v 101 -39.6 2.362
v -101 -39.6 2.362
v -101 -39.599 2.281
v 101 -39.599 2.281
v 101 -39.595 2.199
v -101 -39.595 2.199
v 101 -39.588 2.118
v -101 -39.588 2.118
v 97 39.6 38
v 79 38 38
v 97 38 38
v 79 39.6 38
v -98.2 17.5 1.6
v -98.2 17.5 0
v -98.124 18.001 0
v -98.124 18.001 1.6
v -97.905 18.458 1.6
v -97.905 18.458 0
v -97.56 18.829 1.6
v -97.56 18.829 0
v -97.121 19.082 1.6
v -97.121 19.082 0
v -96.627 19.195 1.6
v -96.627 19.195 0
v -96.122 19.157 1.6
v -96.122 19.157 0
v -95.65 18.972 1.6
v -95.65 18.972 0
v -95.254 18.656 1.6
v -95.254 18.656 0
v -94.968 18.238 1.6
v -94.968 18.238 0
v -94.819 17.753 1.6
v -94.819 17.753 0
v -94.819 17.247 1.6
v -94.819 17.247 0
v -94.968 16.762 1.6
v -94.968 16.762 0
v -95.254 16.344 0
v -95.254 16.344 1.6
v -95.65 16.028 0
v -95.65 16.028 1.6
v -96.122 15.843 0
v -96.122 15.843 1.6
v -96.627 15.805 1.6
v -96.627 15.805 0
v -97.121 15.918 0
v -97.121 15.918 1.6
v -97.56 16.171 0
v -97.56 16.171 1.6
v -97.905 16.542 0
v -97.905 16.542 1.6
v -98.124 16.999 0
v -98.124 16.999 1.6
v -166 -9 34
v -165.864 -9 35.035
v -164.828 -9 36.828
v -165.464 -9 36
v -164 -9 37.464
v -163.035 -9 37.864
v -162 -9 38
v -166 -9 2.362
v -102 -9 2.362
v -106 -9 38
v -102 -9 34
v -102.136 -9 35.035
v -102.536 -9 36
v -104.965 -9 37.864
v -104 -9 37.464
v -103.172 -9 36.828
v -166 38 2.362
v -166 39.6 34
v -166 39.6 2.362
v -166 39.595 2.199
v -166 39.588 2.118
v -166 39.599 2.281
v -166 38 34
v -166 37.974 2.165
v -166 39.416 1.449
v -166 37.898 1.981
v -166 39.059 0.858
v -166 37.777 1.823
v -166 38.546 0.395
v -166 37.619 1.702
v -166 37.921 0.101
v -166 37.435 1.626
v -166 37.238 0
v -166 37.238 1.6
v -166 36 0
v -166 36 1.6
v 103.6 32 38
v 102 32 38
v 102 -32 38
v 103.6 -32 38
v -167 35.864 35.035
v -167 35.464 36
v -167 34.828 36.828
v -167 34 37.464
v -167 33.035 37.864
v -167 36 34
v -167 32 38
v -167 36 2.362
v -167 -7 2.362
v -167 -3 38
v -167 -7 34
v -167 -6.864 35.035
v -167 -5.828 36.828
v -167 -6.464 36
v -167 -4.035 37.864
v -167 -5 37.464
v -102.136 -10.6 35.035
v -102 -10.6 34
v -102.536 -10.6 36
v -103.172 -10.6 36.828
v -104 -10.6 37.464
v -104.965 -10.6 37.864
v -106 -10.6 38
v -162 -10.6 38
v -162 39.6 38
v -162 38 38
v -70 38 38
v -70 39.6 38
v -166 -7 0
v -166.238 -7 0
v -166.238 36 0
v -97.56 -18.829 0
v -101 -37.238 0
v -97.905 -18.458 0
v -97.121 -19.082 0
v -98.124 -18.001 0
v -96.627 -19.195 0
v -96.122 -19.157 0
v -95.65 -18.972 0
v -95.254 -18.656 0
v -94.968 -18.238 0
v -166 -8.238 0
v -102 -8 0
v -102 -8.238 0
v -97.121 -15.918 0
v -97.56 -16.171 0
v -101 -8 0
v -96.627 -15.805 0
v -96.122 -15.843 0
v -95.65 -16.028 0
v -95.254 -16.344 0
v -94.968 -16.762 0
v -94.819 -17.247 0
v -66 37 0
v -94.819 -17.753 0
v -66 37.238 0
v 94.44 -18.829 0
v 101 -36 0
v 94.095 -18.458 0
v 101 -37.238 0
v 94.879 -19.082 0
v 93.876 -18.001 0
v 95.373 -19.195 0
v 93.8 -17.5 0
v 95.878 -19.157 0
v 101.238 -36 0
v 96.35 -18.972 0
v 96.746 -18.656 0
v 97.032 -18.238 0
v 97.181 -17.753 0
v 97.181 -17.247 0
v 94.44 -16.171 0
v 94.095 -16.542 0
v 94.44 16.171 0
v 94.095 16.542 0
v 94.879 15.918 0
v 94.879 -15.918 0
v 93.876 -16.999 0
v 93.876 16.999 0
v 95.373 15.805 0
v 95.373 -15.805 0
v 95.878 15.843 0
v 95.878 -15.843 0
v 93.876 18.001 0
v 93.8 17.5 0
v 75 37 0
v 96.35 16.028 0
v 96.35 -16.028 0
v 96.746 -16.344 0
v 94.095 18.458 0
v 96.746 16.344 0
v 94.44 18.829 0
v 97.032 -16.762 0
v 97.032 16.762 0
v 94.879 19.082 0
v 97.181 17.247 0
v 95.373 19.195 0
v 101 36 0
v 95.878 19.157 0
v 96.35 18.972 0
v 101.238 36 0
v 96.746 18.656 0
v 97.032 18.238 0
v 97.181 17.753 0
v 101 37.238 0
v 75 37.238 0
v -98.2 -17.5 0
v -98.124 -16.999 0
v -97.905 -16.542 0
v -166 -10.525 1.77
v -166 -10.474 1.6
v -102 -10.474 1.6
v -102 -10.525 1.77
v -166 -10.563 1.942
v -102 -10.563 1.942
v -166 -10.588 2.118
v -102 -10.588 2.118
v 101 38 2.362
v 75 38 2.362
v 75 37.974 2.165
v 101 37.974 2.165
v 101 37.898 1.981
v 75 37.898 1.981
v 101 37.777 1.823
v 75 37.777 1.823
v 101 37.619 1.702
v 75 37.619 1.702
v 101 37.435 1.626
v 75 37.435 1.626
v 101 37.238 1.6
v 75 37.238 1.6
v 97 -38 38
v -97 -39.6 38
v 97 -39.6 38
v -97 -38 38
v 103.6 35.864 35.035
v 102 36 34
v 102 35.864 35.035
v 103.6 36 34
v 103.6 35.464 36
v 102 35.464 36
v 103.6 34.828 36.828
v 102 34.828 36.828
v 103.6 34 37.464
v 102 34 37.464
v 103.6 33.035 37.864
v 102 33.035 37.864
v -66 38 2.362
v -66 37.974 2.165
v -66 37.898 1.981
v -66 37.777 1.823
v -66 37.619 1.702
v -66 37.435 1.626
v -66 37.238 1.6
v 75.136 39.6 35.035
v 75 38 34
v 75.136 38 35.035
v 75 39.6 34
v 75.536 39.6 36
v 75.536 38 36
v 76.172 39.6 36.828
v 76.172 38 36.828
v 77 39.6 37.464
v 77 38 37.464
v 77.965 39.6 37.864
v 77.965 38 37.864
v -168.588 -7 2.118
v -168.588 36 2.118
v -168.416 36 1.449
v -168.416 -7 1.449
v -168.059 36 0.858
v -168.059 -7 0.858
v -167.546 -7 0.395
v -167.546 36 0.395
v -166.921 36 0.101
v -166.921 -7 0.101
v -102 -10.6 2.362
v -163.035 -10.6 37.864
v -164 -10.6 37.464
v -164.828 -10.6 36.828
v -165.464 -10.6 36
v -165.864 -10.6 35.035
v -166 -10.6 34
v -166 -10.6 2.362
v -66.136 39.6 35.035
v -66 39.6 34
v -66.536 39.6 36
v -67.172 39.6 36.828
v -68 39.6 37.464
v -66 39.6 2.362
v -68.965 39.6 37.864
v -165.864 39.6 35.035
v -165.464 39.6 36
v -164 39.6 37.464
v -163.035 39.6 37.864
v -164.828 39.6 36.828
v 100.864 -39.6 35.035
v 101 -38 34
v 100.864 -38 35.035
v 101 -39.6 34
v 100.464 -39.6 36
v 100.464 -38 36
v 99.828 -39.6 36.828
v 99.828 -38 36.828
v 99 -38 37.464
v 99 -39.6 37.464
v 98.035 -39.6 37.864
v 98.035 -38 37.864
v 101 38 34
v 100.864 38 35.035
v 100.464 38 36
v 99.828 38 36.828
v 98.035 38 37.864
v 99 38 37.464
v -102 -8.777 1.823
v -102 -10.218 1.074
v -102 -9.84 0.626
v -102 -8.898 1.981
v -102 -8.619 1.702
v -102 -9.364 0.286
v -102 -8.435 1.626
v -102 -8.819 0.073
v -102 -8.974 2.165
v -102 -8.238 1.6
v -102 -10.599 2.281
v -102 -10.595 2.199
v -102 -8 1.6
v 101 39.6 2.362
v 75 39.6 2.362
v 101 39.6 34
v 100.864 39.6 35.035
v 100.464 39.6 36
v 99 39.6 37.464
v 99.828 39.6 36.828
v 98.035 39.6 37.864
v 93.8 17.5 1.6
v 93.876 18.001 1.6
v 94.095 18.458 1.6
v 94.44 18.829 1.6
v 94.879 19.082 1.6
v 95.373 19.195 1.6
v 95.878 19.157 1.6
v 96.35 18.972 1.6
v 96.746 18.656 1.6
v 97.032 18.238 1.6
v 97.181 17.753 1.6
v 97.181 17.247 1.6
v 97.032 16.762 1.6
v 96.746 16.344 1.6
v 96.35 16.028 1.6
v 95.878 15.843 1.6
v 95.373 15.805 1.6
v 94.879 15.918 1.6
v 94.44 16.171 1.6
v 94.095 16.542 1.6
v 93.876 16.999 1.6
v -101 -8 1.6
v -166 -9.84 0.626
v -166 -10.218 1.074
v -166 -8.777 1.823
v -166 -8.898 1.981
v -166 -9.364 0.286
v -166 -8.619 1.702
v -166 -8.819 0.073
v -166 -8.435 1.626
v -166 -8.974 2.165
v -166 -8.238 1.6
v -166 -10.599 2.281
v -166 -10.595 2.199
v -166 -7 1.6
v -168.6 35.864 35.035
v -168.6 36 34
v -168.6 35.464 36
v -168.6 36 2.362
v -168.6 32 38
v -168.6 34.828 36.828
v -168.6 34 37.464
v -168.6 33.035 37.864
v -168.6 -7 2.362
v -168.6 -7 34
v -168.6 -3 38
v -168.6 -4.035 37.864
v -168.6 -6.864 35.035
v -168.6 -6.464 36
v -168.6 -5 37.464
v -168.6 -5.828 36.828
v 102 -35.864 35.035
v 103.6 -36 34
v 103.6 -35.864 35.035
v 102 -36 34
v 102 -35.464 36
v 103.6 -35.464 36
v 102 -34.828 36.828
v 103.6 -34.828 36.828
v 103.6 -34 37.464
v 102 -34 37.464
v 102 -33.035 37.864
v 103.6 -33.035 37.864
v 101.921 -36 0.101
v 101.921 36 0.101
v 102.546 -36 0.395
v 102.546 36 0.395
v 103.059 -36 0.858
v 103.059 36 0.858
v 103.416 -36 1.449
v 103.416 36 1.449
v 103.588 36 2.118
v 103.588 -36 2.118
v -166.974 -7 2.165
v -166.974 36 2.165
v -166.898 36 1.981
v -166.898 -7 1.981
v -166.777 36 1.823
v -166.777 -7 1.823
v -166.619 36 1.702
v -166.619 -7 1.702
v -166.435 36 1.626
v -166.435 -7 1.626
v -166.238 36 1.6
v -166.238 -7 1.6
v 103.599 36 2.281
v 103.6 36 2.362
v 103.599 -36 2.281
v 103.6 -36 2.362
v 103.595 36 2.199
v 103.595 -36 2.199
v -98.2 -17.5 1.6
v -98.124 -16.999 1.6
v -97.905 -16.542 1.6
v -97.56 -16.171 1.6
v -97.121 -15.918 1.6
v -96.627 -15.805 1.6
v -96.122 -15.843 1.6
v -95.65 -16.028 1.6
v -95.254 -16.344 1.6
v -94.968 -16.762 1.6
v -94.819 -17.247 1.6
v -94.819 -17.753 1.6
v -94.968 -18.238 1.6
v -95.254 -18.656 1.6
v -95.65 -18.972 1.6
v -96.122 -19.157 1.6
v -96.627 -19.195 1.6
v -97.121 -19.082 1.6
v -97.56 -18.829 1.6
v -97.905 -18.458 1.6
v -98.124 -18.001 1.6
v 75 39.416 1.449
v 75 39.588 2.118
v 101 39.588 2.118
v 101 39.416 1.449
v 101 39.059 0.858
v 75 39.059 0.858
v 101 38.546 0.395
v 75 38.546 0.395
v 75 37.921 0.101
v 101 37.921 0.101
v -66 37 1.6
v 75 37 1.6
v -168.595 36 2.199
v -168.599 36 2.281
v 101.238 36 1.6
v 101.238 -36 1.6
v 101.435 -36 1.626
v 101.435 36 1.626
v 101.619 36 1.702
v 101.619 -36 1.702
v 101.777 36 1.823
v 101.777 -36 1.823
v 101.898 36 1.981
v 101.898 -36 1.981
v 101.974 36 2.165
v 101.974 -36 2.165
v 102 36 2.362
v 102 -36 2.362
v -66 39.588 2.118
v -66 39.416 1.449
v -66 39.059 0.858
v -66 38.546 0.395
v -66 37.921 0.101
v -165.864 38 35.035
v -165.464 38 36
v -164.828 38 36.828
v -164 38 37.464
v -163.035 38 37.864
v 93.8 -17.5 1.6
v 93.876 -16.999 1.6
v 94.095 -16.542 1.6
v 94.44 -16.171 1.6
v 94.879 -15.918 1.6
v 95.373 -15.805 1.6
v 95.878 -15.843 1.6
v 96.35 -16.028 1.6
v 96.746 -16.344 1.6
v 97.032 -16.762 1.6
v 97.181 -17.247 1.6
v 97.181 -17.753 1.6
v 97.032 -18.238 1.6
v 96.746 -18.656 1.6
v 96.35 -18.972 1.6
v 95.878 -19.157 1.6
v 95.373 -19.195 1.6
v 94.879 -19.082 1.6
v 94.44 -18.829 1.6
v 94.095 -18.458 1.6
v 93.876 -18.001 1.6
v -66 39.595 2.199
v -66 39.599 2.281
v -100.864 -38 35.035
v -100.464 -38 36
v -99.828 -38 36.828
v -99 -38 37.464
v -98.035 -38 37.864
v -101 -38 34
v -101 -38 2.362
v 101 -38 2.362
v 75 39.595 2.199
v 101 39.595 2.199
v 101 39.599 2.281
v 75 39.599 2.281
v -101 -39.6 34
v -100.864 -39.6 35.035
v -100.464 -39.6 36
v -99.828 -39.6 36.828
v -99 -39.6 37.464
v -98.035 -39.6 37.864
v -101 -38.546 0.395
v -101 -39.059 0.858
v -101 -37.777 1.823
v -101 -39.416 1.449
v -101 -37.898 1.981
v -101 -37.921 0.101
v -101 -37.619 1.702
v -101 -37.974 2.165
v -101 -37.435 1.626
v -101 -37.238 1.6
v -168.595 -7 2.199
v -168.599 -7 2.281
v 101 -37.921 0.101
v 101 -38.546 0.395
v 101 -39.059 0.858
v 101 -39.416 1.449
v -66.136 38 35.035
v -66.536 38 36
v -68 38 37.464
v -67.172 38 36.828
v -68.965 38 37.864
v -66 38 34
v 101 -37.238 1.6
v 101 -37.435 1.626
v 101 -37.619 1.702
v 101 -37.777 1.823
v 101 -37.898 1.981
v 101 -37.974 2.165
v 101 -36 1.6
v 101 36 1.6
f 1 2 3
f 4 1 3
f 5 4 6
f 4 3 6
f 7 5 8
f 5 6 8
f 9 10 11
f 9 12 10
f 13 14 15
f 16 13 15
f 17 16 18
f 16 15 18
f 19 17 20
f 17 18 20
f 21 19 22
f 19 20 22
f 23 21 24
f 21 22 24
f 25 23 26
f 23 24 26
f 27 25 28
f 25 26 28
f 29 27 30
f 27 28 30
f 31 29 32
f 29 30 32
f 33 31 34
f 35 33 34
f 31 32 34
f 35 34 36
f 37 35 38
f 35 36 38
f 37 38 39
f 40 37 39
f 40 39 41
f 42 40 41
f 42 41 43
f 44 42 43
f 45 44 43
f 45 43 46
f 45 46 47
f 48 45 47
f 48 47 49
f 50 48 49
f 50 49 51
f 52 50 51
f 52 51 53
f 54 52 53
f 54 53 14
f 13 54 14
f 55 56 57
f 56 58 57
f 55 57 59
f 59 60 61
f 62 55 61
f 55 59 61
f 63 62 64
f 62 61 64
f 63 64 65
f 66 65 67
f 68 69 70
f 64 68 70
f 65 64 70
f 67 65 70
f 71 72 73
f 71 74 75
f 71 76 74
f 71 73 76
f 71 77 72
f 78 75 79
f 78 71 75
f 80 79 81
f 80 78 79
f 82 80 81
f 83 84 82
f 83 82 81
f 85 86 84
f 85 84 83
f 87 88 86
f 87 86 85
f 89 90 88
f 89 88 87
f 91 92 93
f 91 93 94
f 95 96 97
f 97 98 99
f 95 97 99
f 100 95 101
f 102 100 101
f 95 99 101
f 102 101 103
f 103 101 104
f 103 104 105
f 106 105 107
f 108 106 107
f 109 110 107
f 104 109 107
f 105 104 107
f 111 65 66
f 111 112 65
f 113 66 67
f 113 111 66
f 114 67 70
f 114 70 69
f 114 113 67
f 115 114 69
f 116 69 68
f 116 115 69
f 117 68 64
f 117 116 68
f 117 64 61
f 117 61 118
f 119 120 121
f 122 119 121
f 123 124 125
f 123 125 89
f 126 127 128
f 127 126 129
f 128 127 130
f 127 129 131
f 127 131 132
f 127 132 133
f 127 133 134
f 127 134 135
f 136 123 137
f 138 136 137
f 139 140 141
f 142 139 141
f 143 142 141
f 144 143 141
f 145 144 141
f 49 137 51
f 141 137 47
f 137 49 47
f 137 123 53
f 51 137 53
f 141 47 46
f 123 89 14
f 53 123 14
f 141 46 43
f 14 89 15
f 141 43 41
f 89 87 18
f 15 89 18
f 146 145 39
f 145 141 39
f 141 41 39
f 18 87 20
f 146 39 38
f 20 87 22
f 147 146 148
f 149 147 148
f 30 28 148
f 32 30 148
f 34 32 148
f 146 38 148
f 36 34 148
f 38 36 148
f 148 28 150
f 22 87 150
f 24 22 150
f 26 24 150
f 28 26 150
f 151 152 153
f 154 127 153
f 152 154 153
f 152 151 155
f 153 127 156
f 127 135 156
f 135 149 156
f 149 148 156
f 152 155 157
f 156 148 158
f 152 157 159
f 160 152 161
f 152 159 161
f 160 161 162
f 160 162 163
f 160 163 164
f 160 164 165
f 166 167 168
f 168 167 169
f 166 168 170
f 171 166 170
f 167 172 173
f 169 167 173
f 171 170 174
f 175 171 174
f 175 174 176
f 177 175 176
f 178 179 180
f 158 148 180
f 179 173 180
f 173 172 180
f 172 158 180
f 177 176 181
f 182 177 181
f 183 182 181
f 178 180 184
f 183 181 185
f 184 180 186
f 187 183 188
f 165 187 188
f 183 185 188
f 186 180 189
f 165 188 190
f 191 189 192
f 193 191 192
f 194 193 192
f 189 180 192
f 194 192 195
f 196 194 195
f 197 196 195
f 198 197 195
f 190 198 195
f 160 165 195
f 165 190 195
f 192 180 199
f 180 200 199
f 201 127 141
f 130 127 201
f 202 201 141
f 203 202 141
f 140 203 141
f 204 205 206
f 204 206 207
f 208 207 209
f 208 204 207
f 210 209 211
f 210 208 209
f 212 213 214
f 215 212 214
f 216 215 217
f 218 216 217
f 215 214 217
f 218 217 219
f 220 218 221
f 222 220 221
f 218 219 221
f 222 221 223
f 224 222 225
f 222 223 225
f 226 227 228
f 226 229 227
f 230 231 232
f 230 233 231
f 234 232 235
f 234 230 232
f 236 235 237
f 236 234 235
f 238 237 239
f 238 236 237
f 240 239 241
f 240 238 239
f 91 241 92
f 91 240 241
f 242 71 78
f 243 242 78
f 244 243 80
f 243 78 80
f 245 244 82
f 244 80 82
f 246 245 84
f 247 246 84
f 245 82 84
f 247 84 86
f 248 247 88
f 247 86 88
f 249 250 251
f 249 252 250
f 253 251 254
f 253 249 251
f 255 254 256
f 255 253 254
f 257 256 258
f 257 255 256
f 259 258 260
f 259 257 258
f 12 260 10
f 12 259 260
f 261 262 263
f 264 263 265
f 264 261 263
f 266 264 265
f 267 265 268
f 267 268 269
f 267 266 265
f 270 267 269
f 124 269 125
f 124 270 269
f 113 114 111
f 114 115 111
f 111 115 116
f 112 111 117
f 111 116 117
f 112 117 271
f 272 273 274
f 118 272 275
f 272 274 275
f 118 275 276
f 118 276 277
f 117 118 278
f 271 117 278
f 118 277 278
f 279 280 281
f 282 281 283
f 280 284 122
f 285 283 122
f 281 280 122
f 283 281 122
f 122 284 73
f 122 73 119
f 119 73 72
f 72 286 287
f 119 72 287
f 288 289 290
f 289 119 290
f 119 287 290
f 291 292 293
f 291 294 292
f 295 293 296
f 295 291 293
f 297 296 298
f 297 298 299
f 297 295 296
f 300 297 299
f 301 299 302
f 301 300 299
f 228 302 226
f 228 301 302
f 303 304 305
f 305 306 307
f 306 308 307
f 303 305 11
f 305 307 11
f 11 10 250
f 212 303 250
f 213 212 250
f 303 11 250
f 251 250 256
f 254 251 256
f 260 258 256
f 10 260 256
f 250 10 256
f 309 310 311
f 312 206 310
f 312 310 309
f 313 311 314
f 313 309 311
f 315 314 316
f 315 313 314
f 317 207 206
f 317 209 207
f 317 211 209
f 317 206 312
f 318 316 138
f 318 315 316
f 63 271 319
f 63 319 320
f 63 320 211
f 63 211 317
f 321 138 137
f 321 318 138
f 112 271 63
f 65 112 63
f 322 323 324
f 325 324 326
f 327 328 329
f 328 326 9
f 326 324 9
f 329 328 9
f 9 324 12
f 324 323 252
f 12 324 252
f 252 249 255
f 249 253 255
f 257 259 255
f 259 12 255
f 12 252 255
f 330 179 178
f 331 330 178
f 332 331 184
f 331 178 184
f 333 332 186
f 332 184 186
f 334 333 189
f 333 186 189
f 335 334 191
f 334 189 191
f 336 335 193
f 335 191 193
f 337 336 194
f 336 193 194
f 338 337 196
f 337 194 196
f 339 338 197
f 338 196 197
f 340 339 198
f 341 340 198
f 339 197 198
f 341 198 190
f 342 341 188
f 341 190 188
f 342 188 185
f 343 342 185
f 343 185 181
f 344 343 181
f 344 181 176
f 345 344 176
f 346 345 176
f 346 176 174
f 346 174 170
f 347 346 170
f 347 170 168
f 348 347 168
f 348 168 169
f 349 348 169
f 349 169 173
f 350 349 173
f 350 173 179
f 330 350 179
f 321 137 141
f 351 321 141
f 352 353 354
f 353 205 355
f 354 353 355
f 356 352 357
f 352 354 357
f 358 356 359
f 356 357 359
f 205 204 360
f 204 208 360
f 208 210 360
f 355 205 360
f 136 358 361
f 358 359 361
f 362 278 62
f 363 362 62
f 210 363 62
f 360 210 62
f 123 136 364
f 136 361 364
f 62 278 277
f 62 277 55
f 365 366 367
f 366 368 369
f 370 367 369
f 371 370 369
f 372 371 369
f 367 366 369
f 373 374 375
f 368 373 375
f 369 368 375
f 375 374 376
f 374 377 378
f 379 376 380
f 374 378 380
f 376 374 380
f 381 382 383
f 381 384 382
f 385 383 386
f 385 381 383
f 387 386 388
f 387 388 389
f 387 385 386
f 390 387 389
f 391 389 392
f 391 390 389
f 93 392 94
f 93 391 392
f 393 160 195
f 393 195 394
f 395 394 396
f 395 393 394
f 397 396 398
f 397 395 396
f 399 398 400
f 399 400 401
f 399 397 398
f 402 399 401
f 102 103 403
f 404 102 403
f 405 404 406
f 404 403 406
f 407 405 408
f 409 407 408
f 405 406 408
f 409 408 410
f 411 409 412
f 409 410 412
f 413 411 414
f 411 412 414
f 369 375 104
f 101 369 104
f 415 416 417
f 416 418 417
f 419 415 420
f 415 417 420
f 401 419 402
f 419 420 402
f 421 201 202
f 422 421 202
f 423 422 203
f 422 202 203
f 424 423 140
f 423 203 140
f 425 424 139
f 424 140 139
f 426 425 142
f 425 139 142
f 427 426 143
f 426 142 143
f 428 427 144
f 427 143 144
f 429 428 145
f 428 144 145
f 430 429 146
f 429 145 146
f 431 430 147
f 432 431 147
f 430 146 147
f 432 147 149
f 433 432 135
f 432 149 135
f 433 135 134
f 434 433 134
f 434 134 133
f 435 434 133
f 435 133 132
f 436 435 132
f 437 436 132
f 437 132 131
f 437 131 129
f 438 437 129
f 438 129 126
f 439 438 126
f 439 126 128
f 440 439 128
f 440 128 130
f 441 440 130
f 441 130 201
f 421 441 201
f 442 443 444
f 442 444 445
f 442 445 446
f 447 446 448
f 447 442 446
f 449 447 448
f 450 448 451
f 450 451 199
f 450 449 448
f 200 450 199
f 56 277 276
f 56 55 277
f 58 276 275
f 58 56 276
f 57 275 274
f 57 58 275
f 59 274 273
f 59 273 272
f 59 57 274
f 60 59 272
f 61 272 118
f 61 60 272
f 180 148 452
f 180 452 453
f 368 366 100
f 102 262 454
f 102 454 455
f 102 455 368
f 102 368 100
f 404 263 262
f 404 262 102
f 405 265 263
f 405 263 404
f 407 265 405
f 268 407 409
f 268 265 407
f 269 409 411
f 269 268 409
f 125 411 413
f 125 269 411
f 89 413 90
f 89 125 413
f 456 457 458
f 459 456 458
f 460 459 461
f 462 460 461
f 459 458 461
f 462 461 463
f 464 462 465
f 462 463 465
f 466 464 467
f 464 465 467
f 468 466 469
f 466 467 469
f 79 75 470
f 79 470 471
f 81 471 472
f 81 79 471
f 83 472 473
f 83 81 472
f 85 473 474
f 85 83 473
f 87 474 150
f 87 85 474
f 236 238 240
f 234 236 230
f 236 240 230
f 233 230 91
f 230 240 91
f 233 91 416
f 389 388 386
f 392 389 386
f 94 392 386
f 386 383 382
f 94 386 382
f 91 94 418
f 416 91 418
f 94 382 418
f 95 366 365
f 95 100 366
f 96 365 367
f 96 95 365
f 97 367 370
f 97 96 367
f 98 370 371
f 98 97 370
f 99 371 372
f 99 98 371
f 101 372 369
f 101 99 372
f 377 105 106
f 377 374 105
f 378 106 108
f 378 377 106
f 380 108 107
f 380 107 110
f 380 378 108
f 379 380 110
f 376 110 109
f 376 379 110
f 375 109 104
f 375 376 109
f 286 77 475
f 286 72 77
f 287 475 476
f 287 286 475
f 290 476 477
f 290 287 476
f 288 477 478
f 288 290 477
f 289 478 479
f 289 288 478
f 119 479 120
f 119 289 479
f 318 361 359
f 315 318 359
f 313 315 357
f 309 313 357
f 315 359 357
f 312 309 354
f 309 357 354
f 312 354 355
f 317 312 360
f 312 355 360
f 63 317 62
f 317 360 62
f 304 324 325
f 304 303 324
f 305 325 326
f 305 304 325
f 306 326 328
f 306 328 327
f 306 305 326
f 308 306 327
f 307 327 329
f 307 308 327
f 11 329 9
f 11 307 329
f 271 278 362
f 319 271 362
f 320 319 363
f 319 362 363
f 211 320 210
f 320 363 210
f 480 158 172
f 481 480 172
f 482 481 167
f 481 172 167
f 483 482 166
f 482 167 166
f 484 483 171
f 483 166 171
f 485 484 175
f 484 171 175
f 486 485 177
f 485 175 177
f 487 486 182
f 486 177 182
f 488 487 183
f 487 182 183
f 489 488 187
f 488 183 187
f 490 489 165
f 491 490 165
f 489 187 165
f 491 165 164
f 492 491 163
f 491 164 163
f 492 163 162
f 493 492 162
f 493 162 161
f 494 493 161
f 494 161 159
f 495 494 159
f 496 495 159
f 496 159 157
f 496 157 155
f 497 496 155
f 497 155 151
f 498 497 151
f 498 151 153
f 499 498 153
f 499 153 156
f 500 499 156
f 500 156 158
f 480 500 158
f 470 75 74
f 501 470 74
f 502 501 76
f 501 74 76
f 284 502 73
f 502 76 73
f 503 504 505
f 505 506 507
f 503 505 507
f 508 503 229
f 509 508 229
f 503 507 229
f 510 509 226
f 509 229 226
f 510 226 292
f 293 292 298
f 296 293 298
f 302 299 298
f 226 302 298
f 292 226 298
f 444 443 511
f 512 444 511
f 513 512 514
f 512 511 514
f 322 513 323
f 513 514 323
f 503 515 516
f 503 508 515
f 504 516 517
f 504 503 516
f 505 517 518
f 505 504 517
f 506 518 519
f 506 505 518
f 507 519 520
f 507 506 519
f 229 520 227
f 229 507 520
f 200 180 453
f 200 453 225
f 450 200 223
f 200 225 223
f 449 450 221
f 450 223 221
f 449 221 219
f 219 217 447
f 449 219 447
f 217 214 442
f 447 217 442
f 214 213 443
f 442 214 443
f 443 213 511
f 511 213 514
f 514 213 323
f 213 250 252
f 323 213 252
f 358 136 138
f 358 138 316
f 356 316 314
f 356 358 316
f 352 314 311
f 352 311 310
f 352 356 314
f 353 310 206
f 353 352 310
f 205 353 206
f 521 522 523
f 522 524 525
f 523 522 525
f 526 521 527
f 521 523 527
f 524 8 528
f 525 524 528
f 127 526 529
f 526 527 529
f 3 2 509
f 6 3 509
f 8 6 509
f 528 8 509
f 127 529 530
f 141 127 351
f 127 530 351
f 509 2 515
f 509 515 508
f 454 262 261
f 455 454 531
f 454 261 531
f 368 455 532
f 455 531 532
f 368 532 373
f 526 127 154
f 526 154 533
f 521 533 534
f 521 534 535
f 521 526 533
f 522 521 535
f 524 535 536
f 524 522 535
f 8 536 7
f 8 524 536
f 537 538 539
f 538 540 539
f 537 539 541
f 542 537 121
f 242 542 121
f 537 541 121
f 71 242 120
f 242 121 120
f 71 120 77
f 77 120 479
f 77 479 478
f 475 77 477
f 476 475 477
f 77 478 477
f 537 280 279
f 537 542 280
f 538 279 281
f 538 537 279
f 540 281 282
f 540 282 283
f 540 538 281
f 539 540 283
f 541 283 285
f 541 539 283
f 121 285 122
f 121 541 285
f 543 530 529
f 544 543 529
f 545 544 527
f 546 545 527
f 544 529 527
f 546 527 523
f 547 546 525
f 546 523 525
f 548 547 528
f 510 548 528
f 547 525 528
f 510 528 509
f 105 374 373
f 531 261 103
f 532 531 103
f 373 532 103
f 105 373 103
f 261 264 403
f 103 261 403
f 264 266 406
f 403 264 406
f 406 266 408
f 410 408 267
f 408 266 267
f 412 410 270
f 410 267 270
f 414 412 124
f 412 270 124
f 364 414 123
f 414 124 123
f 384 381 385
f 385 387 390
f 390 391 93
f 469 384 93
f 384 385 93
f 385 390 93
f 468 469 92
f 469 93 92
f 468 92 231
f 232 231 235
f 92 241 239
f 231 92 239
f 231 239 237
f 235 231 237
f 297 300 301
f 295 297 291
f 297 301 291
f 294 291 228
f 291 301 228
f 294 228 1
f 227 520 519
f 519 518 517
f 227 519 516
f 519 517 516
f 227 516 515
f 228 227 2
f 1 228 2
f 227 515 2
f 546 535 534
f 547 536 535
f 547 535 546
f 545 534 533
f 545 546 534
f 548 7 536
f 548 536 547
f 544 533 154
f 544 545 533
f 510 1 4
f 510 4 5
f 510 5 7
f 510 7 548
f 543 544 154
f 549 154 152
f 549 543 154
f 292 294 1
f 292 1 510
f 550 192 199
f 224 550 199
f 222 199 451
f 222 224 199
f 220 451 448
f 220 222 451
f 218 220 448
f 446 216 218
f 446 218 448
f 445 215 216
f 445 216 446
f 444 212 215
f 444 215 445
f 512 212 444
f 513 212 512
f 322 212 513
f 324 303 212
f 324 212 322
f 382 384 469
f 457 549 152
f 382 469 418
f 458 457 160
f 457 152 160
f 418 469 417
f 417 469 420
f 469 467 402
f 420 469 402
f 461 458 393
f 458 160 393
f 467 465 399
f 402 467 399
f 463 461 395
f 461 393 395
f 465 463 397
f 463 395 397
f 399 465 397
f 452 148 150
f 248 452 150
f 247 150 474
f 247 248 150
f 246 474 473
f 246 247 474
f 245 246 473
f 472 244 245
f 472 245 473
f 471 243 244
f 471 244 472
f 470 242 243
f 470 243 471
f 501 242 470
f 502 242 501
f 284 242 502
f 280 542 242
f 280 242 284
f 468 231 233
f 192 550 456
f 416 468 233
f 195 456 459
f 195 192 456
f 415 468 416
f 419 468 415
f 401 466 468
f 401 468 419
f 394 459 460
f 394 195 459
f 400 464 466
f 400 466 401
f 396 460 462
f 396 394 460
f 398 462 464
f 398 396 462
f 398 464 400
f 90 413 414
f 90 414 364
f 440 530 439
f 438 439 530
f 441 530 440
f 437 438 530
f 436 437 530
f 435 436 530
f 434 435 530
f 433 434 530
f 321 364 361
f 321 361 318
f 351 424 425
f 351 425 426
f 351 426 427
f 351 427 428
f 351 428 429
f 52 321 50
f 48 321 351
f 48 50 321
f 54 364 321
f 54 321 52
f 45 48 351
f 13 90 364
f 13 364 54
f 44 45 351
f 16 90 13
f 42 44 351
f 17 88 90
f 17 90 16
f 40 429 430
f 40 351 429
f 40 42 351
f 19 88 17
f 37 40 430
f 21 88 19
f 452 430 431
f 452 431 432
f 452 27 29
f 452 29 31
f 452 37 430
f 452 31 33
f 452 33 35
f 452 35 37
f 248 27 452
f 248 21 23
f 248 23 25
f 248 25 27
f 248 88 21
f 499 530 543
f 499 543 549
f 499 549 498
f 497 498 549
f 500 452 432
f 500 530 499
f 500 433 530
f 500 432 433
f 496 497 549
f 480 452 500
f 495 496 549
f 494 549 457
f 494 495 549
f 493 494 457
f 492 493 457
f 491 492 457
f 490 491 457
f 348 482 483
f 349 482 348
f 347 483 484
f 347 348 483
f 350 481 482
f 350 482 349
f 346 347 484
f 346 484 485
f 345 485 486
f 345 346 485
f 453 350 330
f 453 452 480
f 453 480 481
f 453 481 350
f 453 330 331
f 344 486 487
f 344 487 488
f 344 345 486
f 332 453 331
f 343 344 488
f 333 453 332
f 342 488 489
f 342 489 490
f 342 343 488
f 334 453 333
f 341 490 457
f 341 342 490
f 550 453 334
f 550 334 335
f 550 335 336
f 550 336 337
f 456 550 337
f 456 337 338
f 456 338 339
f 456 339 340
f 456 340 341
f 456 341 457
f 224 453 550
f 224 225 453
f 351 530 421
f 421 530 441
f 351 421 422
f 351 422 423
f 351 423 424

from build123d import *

# Parameters (mm, degrees)
SKETCH1_W              = 202
SKETCH1_H              = 74
BOSS_EXTRUDE1_DEPTH    = 1.6002
M3_CLEARANCE_HOLE1_D   = 3.4
SKETCH3_W              = 202
SKETCH3_H              = 2.5875
BOSS_EXTRUDE2_DEPTH    = 38
SKETCH6_W              = 35
SKETCH6_H              = 2.5875
SKETCH6_W_2            = 26
BOSS_EXTRUDE3_DEPTH    = 38
SKETCH7_W              = 2.5875
SKETCH7_H              = 72
BOSS_EXTRUDE4_DEPTH    = 38
SKETCH8_W              = 65
SKETCH8_H              = 45
BOSS_EXTRUDE5_DEPTH    = 1.6002
SKETCH9_W              = 65
SKETCH9_H              = 38
BOSS_EXTRUDE6_DEPTH    = 2.5875
SKETCH10_W             = 2.5875
SKETCH10_H             = 43
SKETCH10_W_2           = 64
SKETCH10_H_2           = 2.5875
BOSS_EXTRUDE7_DEPTH    = 38
CUT_EXTRUDE1_DEPTH     = 36.3998
CONVERT_SOLID1_START   = -101
CONVERT_SOLID1_DEPTH   = 202
CONVERT_SOLID1_START_2 = -166
CONVERT_SOLID1_2_DEPTH = 64
CONVERT_SOLID1_START_3 = -102
CONVERT_SOLID1_3_DEPTH = 36
CONVERT_SOLID1_START_4 = 75
CONVERT_SOLID1_4_DEPTH = 26
CONVERT_SOLID1_START_5 = -7
CONVERT_SOLID1_5_DEPTH = 43
CONVERT_SOLID1_START_6 = -36
CONVERT_SOLID1_6_DEPTH = 29
CONVERT_SOLID1_7_DEPTH = 267
CONVERT_SOLID1_8_DEPTH = 64
CONVERT_SOLID1_9_DEPTH = 72
FILLET1_R              = 4


# Read off the part's stored shape, not the designer's step: Convert-Solid1
with BuildPart() as part:
    # Sketch1 → Boss-Extrude1 (new body)
    with BuildSketch(Plane.XY):
        Rectangle(SKETCH1_W, SKETCH1_H)
    extrude(amount=BOSS_EXTRUDE1_DEPTH)

    # M3 Clearance Hole1 (through all)
    with Locations(Plane.XY.offset(1.6002)):
        with Locations((-96.5, 17.5), (95.5, -17.5), (-96.5, -17.5), (95.5, 17.5)):
            Hole(M3_CLEARANCE_HOLE1_D / 2)

    # Sketch3 → Boss-Extrude2 (add)
    with BuildSketch(Plane.XY):
        with Locations((0, -38.29375)):
            Rectangle(SKETCH3_W, SKETCH3_H)
    extrude(amount=BOSS_EXTRUDE2_DEPTH)

    # Sketch6 → Boss-Extrude3 (add)
    with BuildSketch(Plane.XY):
        with Locations((-83.5, 38.29375)):
            Rectangle(SKETCH6_W, SKETCH6_H)
        with Locations((88, 38.29375)):
            Rectangle(SKETCH6_W_2, SKETCH6_H)
    extrude(amount=BOSS_EXTRUDE3_DEPTH)

    # Sketch7 → Boss-Extrude4 (add)
    with BuildSketch(Plane.XY):
        with Locations((102.29375, 0)):
            Rectangle(SKETCH7_W, SKETCH7_H)
    extrude(amount=BOSS_EXTRUDE4_DEPTH)

    # Sketch8 → Boss-Extrude5 (add)
    with BuildSketch(Plane.XY):
        with Locations((-133.5, 14.5)):
            Rectangle(SKETCH8_W, SKETCH8_H)
    extrude(amount=BOSS_EXTRUDE5_DEPTH)

    # Sketch9 → Boss-Extrude6 (add)
    with BuildSketch(Plane(origin=(0, 37, 0), x_dir=(1, 0, 0), z_dir=(0, 1, 0))):
        with Locations((-133.5, -19)):
            Rectangle(SKETCH9_W, SKETCH9_H)
    extrude(amount=BOSS_EXTRUDE6_DEPTH)

    # Sketch10 → Boss-Extrude7 (add)
    with BuildSketch(Plane.XY):
        with Locations((-167.29375, 14.5)):
            Rectangle(SKETCH10_W, SKETCH10_H)
        with Locations((-134, -9.29375)):
            Rectangle(SKETCH10_W_2, SKETCH10_H_2)
    extrude(amount=BOSS_EXTRUDE7_DEPTH)

    # Sketch15 → Cut-Extrude1 (cut)
    with BuildSketch(Plane.XY.offset(38)):
        Polygon((102, 38), (-167, 38), (-167, -9), (-102, -9), (-102, -38), (102, -38), align=None)
    extrude(amount=-CUT_EXTRUDE1_DEPTH, mode=Mode.SUBTRACT)

    # Convert-Solid1 outline → Convert-Solid1 (add)
    with BuildSketch(Plane.YZ.offset(CONVERT_SOLID1_START)):
        with BuildLine():
            Line((-38, 1.6002), (-37.238, 1.6002))
            ThreePointArc((-37.238, 1.6002), (-37.776815367, 1.823384633), (-38, 2.3622))
            Line((-38, 2.3622), (-38, 1.6002))
        make_face()
        with BuildLine():
            Line((-39.5875, 2.117580723), (-39.5875, 38))
            Line((-39.5875, 38), (-39.6002, 38))
            Line((-39.6002, 38), (-39.6002, 2.3622))
            ThreePointArc((-39.6002, 2.3622), (-39.597022863, 2.239725635), (-39.5875, 2.117580723))
        make_face()
    extrude(amount=CONVERT_SOLID1_DEPTH)

    # Convert-Solid1 2 outline → Convert-Solid1 2 (add)
    with BuildSketch(Plane.YZ.offset(CONVERT_SOLID1_START_2)):
        with BuildLine():
            ThreePointArc((-10.6002, 2.3622), (-10.597022863, 2.239725635), (-10.5875, 2.117580723))
            Line((-10.5875, 2.117580723), (-10.5875, 38))
            Line((-10.5875, 38), (-10.6002, 38))
            Line((-10.6002, 38), (-10.6002, 2.3622))
        make_face()
        with BuildLine():
            Line((-9, 2.3622), (-9, 1.6002))
            Line((-9, 1.6002), (-8.238, 1.6002))
            ThreePointArc((-8.238, 1.6002), (-8.776815367, 1.823384633), (-9, 2.3622))
        make_face()
        with BuildLine():
            ThreePointArc((38, 2.3622), (37.776815367, 1.823384633), (37.238, 1.6002))
            Line((37.238, 1.6002), (38, 1.6002))
            Line((38, 1.6002), (38, 2.3622))
        make_face()
        with BuildLine():
            Line((39.5875, 38), (39.5875, 2.117580723))
            ThreePointArc((39.5875, 2.117580723), (39.597022863, 2.239725635), (39.6002, 2.3622))
            Line((39.6002, 2.3622), (39.6002, 38))
            Line((39.6002, 38), (39.5875, 38))
        make_face()
    extrude(amount=CONVERT_SOLID1_2_DEPTH)

    # Convert-Solid1 3 outline → Convert-Solid1 3 (add)
    with BuildSketch(Plane.YZ.offset(CONVERT_SOLID1_START_3)):
        with BuildLine():
            ThreePointArc((38, 2.3622), (37.776815367, 1.823384633), (37.238, 1.6002))
            Line((37.238, 1.6002), (38, 1.6002))
            Line((38, 1.6002), (38, 2.3622))
        make_face()
        with BuildLine():
            Line((39.5875, 38), (39.5875, 2.117580723))
            ThreePointArc((39.5875, 2.117580723), (39.597022863, 2.239725635), (39.6002, 2.3622))
            Line((39.6002, 2.3622), (39.6002, 38))
            Line((39.6002, 38), (39.5875, 38))
        make_face()
    extrude(amount=CONVERT_SOLID1_3_DEPTH)

    # Convert-Solid1 4 outline → Convert-Solid1 4 (add)
    with BuildSketch(Plane.YZ.offset(CONVERT_SOLID1_START_4)):
        with BuildLine():
            ThreePointArc((38, 2.3622), (37.776815367, 1.823384633), (37.238, 1.6002))
            Line((37.238, 1.6002), (38, 1.6002))
            Line((38, 1.6002), (38, 2.3622))
        make_face()
        with BuildLine():
            Line((39.5875, 38), (39.5875, 2.117580723))
            ThreePointArc((39.5875, 2.117580723), (39.597022863, 2.239725635), (39.6002, 2.3622))
            Line((39.6002, 2.3622), (39.6002, 38))
            Line((39.6002, 38), (39.5875, 38))
        make_face()
    extrude(amount=CONVERT_SOLID1_4_DEPTH)

    # Convert-Solid1 5 outline → Convert-Solid1 5 (add)
    with BuildSketch(Plane(origin=(0, 0, 0), x_dir=(1, 0, 0), z_dir=(0, 1, 0)).offset(CONVERT_SOLID1_START_5)):
        with BuildLine():
            ThreePointArc((-167, -2.3622), (-166.776815367, -1.823384633), (-166.238, -1.6002))
            Line((-166.238, -1.6002), (-167, -1.6002))
            Line((-167, -1.6002), (-167, -2.3622))
        make_face()
        with BuildLine():
            Line((102, -1.6002), (101.238, -1.6002))
            ThreePointArc((101.238, -1.6002), (101.776815367, -1.823384633), (102, -2.3622))
            Line((102, -2.3622), (102, -1.6002))
        make_face()
        with BuildLine():
            Line((-168.6002, -38), (-168.5875, -38))
            Line((-168.5875, -38), (-168.5875, -2.117580723))
            ThreePointArc((-168.5875, -2.117580723), (-168.597022863, -2.239725635), (-168.6002, -2.3622))
            Line((-168.6002, -2.3622), (-168.6002, -38))
        make_face()
        with BuildLine():
            Line((103.5875, -2.117580723), (103.5875, -38))
            Line((103.5875, -38), (103.6002, -38))
            Line((103.6002, -38), (103.6002, -2.3622))
            ThreePointArc((103.6002, -2.3622), (103.597022863, -2.239725635), (103.5875, -2.117580723))
        make_face()
    extrude(amount=CONVERT_SOLID1_5_DEPTH)

    # Convert-Solid1 6 outline → Convert-Solid1 6 (add)
    with BuildSketch(Plane(origin=(0, 0, 0), x_dir=(1, 0, 0), z_dir=(0, 1, 0)).offset(CONVERT_SOLID1_START_6)):
        with BuildLine():
            Line((102, -1.6002), (101.238, -1.6002))
            ThreePointArc((101.238, -1.6002), (101.776815367, -1.823384633), (102, -2.3622))
            Line((102, -2.3622), (102, -1.6002))
        make_face()
        with BuildLine():
            Line((103.5875, -2.117580723), (103.5875, -38))
            Line((103.5875, -38), (103.6002, -38))
            Line((103.6002, -38), (103.6002, -2.3622))
            ThreePointArc((103.6002, -2.3622), (103.597022863, -2.239725635), (103.5875, -2.117580723))
        make_face()
    extrude(amount=CONVERT_SOLID1_6_DEPTH)

    # Convert-Solid1 7 outline → Convert-Solid1 7 (cut)
    with BuildSketch(Plane.YZ.offset(CONVERT_SOLID1_START_2)):
        with BuildLine():
            Line((-10.5875, 2.117580723), (-10.5875, 1.6002))
            Line((-10.5875, 1.6002), (-10.473921475, 1.6002))
            ThreePointArc((-10.473921475, 1.6002), (-10.545258813, 1.855696681), (-10.5875, 2.117580723))
        make_face()
        with BuildLine():
            Line((-39.5875, 0), (-37.238, 0))
            ThreePointArc((-37.238, 0), (-38.81947861, 0.607516482), (-39.5875, 2.117580723))
            Line((-39.5875, 2.117580723), (-39.5875, 0))
        make_face()
        with BuildLine():
            ThreePointArc((39.5875, 2.117580723), (38.81947861, 0.607516482), (37.238, 0))
            Line((37.238, 0), (39.5875, 0))
            Line((39.5875, 0), (39.5875, 2.117580723))
        make_face()
    extrude(amount=CONVERT_SOLID1_7_DEPTH, mode=Mode.SUBTRACT)

    # Convert-Solid1 8 outline → Convert-Solid1 8 (cut)
    with BuildSketch(Plane.YZ.offset(CONVERT_SOLID1_START_2)):
        with BuildLine():
            Line((-10.473921475, 1.6002), (-10.5875, 1.6002))
            Line((-10.5875, 1.6002), (-10.5875, 0))
            Line((-10.5875, 0), (-8.238, 0))
            ThreePointArc((-8.238, 0), (-9.612771334, 0.441264649), (-10.473921475, 1.6002))
        make_face()
    extrude(amount=CONVERT_SOLID1_8_DEPTH, mode=Mode.SUBTRACT)

    # Convert-Solid1 9 outline → Convert-Solid1 9 (cut)
    with BuildSketch(Plane(origin=(0, 0, 0), x_dir=(1, 0, 0), z_dir=(0, 1, 0)).offset(CONVERT_SOLID1_START_6)):
        with BuildLine():
            Line((-168.5875, 0), (-168.5875, -2.117580723))
            ThreePointArc((-168.5875, -2.117580723), (-167.81947861, -0.607516482), (-166.238, 0))
            Line((-166.238, 0), (-168.5875, 0))
        make_face()
        with BuildLine():
            ThreePointArc((101.238, 0), (102.81947861, -0.607516482), (103.5875, -2.117580723))
            Line((103.5875, -2.117580723), (103.5875, 0))
            Line((103.5875, 0), (101.238, 0))
        make_face()
    extrude(amount=CONVERT_SOLID1_9_DEPTH, mode=Mode.SUBTRACT)

    # Fillet1
    fillet1_edges = [part.edges().sort_by_distance(p)[0] for p in [
        (75, 38.8001, 38),
        (101, 38.8001, 38),
        (102.8001, 36, 38),
        (102.8001, -36, 38),
        (101, -38.8001, 38),
        (-101, -38.8001, 38),
        (-102, -9.8001, 38),
        (-166, -9.8001, 38),
        (-167.8001, -7, 38),
        (-167.8001, 36, 38),
        (-166, 38.8001, 38),
        (-66, 38.8001, 38),
    ]]
    fillet(fillet1_edges, radius=FILLET1_R)


solid = part.part
